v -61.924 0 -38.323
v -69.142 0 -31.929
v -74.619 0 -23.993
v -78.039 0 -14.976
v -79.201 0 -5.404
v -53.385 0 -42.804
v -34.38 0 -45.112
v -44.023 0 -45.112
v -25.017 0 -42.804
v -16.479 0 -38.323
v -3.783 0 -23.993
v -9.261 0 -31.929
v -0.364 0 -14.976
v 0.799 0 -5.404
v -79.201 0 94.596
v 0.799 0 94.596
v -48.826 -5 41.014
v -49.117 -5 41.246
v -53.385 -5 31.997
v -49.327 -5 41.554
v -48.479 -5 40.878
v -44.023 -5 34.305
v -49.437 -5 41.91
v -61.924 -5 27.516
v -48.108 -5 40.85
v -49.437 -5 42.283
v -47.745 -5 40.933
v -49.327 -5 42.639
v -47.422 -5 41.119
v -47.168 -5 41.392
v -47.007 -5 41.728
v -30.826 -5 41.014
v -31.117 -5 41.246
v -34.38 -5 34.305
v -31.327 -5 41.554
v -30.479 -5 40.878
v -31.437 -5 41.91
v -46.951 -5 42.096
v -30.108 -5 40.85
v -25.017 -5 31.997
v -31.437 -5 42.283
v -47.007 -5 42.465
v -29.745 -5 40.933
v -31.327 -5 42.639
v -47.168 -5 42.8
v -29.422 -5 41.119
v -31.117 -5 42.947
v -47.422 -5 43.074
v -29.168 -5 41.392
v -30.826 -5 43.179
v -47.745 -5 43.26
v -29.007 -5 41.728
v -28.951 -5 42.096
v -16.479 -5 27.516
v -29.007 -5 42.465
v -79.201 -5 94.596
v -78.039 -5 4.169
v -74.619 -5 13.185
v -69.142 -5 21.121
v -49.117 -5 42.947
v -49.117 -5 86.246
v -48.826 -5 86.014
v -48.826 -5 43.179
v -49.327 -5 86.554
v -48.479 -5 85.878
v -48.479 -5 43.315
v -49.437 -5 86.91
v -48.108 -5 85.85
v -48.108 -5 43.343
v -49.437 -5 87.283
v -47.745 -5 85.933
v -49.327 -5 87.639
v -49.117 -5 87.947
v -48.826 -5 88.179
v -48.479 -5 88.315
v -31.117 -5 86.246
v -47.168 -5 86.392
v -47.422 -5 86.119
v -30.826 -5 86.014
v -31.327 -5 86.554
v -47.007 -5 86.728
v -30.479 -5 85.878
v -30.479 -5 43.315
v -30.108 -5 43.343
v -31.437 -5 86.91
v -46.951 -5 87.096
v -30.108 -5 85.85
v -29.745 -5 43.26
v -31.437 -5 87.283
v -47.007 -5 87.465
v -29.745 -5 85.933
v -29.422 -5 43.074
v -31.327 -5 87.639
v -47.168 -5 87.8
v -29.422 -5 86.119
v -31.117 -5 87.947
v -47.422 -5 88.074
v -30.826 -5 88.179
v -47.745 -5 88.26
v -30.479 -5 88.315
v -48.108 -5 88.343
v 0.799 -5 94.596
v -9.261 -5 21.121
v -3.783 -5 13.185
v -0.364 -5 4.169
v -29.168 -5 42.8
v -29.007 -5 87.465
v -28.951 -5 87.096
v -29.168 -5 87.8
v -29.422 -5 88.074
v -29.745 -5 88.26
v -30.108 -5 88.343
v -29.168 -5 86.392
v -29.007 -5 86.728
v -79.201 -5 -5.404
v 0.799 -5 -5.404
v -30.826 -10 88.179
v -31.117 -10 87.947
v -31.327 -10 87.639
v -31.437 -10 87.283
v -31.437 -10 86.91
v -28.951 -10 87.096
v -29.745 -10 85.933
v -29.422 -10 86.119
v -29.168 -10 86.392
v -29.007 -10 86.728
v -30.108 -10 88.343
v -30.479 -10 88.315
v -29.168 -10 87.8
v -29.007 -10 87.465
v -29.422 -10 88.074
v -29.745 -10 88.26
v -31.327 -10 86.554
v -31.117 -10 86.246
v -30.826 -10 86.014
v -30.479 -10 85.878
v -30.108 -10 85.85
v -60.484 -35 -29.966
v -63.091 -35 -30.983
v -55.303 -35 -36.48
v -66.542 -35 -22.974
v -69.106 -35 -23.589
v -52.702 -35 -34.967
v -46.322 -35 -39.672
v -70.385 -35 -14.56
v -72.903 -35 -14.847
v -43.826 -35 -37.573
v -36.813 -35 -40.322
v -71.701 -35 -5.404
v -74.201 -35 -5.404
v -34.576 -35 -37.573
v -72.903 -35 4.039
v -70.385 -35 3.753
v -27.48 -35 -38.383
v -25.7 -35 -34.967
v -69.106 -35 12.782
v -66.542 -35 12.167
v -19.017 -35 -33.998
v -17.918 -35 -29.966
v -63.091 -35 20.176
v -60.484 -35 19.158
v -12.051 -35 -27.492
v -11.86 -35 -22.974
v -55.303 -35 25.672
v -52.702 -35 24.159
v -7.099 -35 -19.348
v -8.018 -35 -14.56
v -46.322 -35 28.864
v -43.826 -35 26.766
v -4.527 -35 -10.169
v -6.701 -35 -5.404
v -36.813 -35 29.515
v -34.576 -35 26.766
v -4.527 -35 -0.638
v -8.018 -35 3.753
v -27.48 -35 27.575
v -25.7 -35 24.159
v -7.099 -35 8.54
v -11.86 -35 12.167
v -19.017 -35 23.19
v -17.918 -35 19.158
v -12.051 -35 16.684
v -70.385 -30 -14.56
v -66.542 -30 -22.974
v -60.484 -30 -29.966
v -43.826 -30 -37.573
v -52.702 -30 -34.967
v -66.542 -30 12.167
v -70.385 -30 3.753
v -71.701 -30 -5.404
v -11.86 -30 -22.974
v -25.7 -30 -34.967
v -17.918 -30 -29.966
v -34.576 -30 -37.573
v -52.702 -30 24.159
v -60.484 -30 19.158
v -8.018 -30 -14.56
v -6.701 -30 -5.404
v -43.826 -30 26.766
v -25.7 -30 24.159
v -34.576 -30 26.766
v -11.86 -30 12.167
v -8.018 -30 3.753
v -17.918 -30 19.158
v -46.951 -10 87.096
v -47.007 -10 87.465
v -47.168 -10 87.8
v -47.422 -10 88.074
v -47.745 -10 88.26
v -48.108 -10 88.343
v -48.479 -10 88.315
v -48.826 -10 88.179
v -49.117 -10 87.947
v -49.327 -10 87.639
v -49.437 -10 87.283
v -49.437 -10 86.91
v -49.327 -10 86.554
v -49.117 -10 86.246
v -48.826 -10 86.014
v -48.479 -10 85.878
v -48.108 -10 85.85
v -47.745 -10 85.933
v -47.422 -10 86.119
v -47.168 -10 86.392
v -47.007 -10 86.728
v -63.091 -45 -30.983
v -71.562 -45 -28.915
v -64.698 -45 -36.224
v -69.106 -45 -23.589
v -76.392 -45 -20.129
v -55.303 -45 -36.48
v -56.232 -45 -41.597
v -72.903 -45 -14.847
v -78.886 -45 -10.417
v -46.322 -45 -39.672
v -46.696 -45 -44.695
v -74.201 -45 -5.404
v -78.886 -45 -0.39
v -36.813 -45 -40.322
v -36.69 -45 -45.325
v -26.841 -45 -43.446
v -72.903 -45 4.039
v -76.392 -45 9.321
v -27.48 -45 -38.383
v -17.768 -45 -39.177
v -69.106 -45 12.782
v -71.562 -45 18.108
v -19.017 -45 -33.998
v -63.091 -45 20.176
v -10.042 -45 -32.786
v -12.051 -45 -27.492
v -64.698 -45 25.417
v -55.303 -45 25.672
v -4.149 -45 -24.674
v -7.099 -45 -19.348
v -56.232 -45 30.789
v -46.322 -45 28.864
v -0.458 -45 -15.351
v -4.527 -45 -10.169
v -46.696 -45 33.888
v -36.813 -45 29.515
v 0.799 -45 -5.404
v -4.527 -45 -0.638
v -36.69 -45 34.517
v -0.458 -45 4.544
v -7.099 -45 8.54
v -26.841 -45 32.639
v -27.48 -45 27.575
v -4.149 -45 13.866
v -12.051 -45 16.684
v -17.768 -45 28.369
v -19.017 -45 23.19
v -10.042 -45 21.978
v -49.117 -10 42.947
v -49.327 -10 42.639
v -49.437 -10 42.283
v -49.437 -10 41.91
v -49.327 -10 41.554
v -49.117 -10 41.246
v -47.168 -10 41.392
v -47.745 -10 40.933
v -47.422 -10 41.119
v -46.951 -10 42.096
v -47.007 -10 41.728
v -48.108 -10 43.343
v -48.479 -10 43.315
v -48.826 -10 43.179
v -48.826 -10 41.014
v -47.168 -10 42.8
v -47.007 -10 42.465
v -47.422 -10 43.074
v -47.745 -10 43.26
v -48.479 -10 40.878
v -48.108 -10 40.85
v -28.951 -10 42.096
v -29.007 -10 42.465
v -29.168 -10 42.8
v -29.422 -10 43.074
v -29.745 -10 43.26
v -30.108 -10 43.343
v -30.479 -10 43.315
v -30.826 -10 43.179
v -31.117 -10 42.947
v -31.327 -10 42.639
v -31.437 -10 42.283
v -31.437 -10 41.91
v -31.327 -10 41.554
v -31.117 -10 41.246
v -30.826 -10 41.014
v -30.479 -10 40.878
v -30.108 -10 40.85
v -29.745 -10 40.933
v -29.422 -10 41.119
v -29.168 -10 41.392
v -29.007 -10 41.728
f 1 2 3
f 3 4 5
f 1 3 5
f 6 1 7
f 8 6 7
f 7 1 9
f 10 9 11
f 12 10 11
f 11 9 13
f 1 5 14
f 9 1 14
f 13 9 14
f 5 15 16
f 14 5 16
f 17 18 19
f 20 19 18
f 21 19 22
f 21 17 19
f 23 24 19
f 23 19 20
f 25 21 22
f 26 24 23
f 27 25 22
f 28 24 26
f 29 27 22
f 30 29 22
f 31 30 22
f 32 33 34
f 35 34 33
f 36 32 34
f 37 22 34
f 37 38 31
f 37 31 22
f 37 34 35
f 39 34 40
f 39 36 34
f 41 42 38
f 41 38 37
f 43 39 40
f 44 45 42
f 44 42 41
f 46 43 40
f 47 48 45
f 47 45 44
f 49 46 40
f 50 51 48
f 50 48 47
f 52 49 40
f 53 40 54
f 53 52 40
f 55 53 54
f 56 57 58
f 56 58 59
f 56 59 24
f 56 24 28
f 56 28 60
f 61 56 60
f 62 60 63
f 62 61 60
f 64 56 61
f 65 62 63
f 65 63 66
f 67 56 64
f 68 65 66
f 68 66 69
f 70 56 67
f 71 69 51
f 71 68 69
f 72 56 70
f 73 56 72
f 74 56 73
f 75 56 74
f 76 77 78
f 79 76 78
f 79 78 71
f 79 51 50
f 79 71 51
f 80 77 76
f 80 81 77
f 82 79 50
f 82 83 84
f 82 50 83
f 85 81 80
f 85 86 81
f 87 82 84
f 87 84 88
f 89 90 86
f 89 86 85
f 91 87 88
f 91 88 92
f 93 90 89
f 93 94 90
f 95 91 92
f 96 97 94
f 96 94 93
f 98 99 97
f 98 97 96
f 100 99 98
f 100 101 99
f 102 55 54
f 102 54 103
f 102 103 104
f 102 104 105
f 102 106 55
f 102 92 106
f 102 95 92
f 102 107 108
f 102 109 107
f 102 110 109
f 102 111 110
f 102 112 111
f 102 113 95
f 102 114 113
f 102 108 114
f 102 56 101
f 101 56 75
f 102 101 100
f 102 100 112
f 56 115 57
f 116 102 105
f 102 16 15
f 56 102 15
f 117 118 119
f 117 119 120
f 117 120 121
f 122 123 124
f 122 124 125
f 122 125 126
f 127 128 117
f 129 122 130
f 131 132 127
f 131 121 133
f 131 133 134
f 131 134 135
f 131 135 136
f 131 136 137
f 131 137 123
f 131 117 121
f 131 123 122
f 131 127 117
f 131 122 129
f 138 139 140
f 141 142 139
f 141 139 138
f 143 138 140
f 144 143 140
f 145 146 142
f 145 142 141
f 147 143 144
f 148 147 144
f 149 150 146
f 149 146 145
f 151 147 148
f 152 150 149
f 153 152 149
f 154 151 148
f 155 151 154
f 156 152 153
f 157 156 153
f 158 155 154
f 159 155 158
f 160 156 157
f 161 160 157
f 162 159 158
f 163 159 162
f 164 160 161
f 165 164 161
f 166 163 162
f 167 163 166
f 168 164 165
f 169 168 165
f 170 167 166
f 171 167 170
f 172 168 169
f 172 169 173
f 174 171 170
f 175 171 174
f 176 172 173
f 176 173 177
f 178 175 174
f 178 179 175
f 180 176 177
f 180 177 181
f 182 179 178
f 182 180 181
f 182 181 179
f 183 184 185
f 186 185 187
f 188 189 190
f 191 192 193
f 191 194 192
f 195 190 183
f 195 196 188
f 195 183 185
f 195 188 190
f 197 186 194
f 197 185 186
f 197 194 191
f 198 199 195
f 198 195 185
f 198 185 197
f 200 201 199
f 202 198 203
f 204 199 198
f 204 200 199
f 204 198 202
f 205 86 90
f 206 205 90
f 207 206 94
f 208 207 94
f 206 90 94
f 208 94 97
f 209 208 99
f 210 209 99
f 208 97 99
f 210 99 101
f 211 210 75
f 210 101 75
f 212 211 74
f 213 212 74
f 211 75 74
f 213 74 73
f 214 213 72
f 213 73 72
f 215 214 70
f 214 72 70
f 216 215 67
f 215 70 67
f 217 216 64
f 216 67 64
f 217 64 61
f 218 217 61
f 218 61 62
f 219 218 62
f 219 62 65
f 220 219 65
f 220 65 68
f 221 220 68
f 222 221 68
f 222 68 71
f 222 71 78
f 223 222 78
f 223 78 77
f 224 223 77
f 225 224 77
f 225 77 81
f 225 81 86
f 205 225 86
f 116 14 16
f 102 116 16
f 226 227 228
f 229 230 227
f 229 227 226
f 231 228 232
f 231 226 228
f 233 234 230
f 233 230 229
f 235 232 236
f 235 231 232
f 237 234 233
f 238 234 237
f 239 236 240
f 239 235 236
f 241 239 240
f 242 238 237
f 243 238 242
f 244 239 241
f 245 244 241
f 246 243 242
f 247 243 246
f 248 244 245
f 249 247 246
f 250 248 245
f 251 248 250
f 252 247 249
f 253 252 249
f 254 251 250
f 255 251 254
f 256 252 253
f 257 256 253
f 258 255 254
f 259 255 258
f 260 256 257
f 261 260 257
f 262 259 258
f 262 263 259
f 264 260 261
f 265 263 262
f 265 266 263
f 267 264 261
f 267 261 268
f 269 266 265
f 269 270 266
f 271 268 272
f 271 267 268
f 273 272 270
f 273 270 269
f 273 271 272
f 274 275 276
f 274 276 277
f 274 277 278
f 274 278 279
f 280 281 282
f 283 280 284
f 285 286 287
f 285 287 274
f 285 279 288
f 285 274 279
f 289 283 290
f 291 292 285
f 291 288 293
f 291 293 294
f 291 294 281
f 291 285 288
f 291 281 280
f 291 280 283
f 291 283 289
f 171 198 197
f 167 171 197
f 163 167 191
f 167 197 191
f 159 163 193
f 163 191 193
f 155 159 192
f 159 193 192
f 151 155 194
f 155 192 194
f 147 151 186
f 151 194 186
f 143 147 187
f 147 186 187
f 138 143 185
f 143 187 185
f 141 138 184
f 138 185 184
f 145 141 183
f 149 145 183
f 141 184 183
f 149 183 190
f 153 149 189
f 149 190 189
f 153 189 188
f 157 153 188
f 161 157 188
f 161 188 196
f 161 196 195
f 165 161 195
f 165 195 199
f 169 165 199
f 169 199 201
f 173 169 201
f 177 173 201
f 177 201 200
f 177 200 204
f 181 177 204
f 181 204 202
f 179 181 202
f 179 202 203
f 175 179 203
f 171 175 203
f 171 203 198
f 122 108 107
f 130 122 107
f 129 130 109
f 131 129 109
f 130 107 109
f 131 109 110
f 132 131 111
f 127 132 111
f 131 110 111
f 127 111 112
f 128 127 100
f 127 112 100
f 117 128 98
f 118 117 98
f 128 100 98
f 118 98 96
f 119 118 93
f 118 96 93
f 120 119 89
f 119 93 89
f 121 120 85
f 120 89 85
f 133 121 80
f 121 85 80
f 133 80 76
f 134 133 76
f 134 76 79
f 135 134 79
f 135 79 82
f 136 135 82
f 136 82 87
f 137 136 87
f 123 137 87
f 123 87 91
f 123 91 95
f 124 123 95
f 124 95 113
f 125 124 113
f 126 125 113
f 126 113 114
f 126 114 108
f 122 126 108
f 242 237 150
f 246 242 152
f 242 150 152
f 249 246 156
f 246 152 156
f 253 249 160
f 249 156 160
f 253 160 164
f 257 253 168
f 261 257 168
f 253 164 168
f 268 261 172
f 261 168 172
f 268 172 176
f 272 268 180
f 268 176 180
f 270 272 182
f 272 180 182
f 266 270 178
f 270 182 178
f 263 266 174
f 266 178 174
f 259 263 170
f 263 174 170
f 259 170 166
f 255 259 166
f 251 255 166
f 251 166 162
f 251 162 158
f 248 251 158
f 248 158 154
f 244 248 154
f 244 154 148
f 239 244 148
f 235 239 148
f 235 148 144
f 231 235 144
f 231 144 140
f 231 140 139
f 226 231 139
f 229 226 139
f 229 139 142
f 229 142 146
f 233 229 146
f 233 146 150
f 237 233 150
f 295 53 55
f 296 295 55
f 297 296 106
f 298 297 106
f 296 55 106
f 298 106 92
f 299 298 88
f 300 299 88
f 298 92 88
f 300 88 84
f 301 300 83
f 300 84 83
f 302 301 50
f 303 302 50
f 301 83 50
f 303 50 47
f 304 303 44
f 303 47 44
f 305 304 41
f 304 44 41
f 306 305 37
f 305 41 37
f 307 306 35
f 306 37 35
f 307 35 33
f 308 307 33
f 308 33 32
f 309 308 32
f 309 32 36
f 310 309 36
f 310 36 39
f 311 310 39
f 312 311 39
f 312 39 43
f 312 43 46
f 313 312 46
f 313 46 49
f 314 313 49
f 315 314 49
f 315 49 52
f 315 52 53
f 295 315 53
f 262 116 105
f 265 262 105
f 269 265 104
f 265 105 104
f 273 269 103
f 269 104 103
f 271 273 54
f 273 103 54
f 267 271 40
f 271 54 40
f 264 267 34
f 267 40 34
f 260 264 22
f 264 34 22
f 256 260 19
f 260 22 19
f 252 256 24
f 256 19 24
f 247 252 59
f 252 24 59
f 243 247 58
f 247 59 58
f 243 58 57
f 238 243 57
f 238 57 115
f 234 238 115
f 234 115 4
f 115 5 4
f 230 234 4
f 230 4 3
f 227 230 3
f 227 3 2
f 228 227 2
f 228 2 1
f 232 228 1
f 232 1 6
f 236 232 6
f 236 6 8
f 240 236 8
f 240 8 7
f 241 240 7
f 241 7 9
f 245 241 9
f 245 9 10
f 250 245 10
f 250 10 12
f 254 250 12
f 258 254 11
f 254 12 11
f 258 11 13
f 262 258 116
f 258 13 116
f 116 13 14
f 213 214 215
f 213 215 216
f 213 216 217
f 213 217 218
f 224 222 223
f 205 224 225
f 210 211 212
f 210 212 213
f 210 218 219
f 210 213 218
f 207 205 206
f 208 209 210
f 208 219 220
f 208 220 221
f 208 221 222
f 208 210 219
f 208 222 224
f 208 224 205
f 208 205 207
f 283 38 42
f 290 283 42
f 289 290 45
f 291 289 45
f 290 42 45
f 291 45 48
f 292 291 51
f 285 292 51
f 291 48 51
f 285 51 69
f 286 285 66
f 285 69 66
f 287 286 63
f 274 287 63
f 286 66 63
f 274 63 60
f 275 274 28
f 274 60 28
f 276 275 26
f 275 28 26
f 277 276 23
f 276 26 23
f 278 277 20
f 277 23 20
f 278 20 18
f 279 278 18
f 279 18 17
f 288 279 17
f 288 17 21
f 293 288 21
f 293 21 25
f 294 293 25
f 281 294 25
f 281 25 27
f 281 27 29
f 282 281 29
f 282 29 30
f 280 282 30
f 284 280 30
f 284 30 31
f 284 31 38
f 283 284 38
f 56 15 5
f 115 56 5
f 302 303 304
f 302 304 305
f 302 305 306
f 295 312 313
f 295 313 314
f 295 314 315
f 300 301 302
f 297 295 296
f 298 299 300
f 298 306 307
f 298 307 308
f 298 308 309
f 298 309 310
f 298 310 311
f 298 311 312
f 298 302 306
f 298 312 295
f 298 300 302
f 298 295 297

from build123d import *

# Parameters (mm, degrees)
F0_R     = 1.25
F1_DEPTH = 5
F2_DEPTH = 45
F3_DEPTH = 35
F4_DEPTH = 30
F5_DEPTH = 10


with BuildPart() as f1:
    # F0 (on Front) → F1 (new body)
    with BuildSketch(Plane.XZ):
        with BuildLine():
            Line((0.7988151149, 94.5963411382), (-79.2011848851, 94.5963411382))
            Line((-79.2011848851, 94.5963411382), (-79.2011848851, -5.4036588618))
            ThreePointArc((-79.2011848851, -5.4036588618), (-39.2011848851, 34.5963411382), (0.7988151149, -5.4036588618))
            Line((0.7988151149, -5.4036588618), (0.7988151149, 94.5963411382))
        make_face()
        with Locations((-48.2011848851, 42.0963411382)):
            Circle(F0_R, mode=Mode.SUBTRACT)
        with Locations((-48.2011848851, 87.0963411382)):
            Circle(F0_R, mode=Mode.SUBTRACT)
        with Locations((-30.2011848851, 42.0963411382)):
            Circle(F0_R, mode=Mode.SUBTRACT)
        with Locations((-30.2011848851, 87.0963411382)):
            Circle(F0_R, mode=Mode.SUBTRACT)
    extrude(amount=F1_DEPTH)

    # F0 (on Front) → F2 (join)
    with BuildSketch(Plane.XZ):
        with BuildLine():
            Line((-74.2011848851, -5.4036588618), (-79.2011848851, -5.4036588618))
            ThreePointArc((-79.2011848851, -5.4036588618), (-39.2011848851, -45.4036588618), (0.7988151149, -5.4036588618))
            Line((0.7988151149, -5.4036588618), (-4.2011848851, -5.4036588618))
            ThreePointArc((-4.2011848851, -5.4036588618), (-39.2011848851, -40.4036588618), (-74.2011848851, -5.4036588618))
        make_face()
        with BuildLine():
            ThreePointArc((0.7988151149, -5.4036588618), (-39.2011848851, 34.5963411382), (-79.2011848851, -5.4036588618))
            Line((-79.2011848851, -5.4036588618), (-74.2011848851, -5.4036588618))
            ThreePointArc((-74.2011848851, -5.4036588618), (-39.2011848851, 29.5963411382), (-4.2011848851, -5.4036588618))
            Line((-4.2011848851, -5.4036588618), (0.7988151149, -5.4036588618))
        make_face()
    extrude(amount=F2_DEPTH)

    # F0 (on Front) → F3 (join)
    with BuildSketch(Plane.XZ):
        with BuildLine():
            ThreePointArc((-4.2011848851, -5.4036588618), (-39.2011848851, 29.5963411382), (-74.2011848851, -5.4036588618))
            Line((-74.2011848851, -5.4036588618), (-71.7011848851, -5.4036588618))
            ThreePointArc((-71.7011848851, -5.4036588618), (-39.2011848851, 27.0963411382), (-6.7011848851, -5.4036588618))
            Line((-6.7011848851, -5.4036588618), (-4.2011848851, -5.4036588618))
        make_face()
        with BuildLine():
            Line((-71.7011848851, -5.4036588618), (-74.2011848851, -5.4036588618))
            ThreePointArc((-74.2011848851, -5.4036588618), (-39.2011848851, -40.4036588618), (-4.2011848851, -5.4036588618))
            Line((-4.2011848851, -5.4036588618), (-6.7011848851, -5.4036588618))
            ThreePointArc((-6.7011848851, -5.4036588618), (-39.2011848851, -37.9036588618), (-71.7011848851, -5.4036588618))
        make_face()
    extrude(amount=F3_DEPTH)

    # F0 (on Front) → F4 (join)
    with BuildSketch(Plane.XZ):
        with BuildLine():
            ThreePointArc((-6.7011848851, -5.4036588618), (-39.2011848851, 27.0963411382), (-71.7011848851, -5.4036588618))
            Line((-71.7011848851, -5.4036588618), (-6.7011848851, -5.4036588618))
        make_face()
        with BuildLine():
            Line((-6.7011848851, -5.4036588618), (-71.7011848851, -5.4036588618))
            ThreePointArc((-71.7011848851, -5.4036588618), (-39.2011848851, -37.9036588618), (-6.7011848851, -5.4036588618))
        make_face()
    extrude(amount=F4_DEPTH)

    # F0 (on Front) → F5 (join)
    with BuildSketch(Plane.XZ):
        with Locations((-30.2011848851, 42.0963411382)):
            Circle(F0_R)
        with Locations((-48.2011848851, 42.0963411382)):
            Circle(F0_R)
        with Locations((-48.2011848851, 87.0963411382)):
            Circle(F0_R)
        with Locations((-30.2011848851, 87.0963411382)):
            Circle(F0_R)
    extrude(amount=F5_DEPTH)


solid = f1.part
